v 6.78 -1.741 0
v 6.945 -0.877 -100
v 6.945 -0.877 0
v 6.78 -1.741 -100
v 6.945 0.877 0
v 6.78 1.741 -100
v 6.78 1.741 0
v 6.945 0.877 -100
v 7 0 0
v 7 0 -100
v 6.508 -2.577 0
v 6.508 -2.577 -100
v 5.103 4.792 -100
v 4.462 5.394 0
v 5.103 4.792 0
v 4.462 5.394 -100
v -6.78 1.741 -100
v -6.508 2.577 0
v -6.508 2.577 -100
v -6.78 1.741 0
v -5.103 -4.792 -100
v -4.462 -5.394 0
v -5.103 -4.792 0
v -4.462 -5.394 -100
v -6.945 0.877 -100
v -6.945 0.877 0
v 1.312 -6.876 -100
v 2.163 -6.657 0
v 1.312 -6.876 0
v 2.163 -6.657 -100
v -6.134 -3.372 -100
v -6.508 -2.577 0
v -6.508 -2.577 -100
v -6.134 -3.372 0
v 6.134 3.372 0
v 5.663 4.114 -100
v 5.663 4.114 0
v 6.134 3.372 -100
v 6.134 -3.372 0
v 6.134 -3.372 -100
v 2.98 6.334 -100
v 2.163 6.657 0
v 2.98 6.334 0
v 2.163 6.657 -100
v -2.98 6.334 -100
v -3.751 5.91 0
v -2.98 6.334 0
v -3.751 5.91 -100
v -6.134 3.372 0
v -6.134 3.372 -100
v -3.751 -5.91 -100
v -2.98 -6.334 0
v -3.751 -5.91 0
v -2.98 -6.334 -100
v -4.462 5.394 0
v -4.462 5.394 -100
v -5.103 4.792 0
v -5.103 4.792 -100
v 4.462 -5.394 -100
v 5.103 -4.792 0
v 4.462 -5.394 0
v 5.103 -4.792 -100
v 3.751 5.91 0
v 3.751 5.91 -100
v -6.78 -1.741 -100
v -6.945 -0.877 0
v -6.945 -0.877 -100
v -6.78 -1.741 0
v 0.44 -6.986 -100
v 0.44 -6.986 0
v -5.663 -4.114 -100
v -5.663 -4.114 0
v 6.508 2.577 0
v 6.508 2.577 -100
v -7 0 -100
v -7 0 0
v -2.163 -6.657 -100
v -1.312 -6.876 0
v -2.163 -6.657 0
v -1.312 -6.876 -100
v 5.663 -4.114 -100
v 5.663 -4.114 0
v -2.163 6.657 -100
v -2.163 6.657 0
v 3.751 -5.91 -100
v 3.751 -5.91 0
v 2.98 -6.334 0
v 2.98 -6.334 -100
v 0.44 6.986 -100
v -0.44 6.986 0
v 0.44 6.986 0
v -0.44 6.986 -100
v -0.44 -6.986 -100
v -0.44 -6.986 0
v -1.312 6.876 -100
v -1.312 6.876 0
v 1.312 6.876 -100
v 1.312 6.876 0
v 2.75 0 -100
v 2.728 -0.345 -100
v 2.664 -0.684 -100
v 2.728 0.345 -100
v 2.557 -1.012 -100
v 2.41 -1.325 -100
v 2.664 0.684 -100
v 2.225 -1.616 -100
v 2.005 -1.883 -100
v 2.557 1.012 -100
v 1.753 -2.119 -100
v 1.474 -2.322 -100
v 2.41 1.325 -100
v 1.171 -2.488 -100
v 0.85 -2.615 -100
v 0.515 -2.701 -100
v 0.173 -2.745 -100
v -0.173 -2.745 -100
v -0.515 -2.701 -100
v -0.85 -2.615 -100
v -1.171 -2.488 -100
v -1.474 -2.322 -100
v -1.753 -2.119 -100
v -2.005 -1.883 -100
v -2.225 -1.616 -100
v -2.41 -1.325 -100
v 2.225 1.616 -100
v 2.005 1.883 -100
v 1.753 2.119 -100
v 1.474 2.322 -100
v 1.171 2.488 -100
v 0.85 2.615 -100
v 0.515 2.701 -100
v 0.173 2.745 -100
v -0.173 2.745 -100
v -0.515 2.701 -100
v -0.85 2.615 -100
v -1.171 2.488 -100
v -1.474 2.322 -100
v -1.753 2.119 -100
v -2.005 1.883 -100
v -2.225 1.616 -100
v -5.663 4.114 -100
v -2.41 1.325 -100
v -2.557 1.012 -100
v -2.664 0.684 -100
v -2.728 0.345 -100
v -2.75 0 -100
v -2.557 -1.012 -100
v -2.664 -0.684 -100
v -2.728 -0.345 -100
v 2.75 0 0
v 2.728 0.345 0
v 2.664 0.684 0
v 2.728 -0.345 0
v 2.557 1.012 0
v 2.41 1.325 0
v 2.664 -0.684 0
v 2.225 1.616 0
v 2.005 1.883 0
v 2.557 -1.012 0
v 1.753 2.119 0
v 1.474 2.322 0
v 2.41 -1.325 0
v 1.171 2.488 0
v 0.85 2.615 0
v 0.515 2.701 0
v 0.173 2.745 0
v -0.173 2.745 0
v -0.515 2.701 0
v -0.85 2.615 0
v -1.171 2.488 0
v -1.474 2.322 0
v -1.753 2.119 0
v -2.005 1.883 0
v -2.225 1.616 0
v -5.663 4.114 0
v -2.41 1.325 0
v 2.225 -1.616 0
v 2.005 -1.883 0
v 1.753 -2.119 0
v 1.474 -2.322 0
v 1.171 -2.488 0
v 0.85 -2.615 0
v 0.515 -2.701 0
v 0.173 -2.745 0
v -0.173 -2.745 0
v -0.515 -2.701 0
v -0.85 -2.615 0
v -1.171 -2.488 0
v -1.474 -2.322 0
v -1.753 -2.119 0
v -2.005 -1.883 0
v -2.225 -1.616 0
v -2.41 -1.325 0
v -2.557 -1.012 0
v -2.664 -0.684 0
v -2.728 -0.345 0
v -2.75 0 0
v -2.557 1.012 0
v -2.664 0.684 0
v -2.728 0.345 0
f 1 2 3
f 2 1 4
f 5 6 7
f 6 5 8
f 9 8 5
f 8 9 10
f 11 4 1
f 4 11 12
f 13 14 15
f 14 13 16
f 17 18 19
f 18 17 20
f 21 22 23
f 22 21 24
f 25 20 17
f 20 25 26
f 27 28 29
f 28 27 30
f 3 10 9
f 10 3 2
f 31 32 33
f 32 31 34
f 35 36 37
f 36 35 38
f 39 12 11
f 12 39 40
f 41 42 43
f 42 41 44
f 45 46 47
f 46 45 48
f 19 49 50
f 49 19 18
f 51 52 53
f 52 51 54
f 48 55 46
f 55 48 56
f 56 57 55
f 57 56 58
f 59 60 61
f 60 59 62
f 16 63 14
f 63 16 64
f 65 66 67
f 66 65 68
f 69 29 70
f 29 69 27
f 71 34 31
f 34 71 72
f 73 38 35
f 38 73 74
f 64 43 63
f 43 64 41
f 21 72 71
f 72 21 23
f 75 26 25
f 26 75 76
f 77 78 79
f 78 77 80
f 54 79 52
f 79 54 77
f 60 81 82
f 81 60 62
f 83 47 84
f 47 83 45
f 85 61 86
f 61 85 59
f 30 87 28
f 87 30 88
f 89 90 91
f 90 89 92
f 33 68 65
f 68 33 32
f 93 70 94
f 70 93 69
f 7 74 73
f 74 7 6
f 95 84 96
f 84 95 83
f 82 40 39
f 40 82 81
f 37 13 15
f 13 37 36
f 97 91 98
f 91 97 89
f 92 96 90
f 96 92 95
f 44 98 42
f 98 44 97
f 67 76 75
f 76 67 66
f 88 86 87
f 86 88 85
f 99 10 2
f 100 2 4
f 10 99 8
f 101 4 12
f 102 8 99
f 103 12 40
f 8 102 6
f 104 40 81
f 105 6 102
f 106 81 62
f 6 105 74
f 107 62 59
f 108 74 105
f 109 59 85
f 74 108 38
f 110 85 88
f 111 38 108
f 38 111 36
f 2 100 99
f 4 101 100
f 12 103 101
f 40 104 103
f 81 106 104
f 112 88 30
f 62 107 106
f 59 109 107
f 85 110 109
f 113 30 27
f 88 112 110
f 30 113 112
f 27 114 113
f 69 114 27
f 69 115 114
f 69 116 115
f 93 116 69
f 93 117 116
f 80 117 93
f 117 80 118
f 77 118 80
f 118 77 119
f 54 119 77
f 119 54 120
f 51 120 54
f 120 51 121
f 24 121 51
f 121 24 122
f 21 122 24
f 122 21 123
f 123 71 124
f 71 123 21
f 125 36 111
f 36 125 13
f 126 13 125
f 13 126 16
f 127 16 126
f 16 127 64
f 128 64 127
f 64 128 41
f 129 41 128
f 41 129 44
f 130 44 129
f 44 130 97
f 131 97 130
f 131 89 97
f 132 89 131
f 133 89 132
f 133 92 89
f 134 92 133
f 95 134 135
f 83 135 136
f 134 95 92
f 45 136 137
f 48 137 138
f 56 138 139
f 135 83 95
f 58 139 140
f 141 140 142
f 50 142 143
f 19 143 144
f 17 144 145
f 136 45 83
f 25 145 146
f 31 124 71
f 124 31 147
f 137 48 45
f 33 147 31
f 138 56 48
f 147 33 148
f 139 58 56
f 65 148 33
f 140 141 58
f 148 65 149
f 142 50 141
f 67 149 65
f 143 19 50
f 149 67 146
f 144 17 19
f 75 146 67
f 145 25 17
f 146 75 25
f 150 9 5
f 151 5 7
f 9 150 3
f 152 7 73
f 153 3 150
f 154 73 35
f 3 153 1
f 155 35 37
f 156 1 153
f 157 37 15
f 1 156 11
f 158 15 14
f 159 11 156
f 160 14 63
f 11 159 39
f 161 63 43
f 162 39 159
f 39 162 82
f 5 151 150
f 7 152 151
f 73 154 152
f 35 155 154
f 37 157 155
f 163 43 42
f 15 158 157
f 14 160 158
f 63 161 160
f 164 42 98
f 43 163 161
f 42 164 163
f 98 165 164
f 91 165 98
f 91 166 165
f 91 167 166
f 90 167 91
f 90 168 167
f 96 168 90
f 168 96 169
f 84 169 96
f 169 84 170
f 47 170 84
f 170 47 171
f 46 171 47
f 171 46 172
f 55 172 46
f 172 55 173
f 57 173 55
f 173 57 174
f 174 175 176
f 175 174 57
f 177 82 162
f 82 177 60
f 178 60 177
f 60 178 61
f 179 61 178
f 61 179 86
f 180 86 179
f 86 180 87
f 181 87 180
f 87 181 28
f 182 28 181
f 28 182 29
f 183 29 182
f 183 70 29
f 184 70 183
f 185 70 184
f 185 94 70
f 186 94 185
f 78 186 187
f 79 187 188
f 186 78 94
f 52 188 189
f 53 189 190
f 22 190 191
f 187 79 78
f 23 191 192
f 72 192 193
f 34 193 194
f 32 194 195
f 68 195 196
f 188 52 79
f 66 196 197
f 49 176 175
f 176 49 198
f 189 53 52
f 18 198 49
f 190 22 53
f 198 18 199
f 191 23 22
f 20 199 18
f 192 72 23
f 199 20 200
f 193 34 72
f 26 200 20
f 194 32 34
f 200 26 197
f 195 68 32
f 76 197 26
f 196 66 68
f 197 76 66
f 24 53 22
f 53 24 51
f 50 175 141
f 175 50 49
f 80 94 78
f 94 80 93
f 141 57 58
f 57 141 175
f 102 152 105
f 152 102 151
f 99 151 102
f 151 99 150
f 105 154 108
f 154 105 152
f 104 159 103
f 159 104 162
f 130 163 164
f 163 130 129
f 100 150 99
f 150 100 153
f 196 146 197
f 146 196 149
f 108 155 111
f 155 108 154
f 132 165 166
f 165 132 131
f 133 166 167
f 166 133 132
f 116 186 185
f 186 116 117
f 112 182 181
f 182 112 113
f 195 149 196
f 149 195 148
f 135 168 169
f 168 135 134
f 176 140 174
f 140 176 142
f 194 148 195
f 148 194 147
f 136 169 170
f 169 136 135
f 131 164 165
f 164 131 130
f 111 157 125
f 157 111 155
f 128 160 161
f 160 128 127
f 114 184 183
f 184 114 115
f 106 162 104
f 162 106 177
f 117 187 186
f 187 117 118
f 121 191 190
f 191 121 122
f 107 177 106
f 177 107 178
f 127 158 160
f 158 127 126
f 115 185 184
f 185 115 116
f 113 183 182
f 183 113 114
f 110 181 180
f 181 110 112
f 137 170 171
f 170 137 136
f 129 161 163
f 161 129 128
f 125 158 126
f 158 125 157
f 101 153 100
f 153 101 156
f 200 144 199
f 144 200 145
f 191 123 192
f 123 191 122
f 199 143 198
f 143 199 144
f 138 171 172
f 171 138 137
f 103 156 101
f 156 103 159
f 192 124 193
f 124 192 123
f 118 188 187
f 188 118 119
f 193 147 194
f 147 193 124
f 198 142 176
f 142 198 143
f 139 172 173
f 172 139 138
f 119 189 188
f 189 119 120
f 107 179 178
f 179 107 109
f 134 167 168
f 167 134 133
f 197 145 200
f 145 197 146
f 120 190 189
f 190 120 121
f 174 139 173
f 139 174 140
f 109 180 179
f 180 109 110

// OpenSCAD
$fn = 50;


difference() {
	union() {
		translate(v = [0, 0, -100.0000000000]) {
			cylinder(h = 100, r = 7.0000000000);
		}
		cylinder(h = 0, r = 17.0000000000);
	}
	union() {
		#translate(v = [0, 0, -100]) {
			cylinder(h = 100, r = 2.7500000000);
		}
	}
}
